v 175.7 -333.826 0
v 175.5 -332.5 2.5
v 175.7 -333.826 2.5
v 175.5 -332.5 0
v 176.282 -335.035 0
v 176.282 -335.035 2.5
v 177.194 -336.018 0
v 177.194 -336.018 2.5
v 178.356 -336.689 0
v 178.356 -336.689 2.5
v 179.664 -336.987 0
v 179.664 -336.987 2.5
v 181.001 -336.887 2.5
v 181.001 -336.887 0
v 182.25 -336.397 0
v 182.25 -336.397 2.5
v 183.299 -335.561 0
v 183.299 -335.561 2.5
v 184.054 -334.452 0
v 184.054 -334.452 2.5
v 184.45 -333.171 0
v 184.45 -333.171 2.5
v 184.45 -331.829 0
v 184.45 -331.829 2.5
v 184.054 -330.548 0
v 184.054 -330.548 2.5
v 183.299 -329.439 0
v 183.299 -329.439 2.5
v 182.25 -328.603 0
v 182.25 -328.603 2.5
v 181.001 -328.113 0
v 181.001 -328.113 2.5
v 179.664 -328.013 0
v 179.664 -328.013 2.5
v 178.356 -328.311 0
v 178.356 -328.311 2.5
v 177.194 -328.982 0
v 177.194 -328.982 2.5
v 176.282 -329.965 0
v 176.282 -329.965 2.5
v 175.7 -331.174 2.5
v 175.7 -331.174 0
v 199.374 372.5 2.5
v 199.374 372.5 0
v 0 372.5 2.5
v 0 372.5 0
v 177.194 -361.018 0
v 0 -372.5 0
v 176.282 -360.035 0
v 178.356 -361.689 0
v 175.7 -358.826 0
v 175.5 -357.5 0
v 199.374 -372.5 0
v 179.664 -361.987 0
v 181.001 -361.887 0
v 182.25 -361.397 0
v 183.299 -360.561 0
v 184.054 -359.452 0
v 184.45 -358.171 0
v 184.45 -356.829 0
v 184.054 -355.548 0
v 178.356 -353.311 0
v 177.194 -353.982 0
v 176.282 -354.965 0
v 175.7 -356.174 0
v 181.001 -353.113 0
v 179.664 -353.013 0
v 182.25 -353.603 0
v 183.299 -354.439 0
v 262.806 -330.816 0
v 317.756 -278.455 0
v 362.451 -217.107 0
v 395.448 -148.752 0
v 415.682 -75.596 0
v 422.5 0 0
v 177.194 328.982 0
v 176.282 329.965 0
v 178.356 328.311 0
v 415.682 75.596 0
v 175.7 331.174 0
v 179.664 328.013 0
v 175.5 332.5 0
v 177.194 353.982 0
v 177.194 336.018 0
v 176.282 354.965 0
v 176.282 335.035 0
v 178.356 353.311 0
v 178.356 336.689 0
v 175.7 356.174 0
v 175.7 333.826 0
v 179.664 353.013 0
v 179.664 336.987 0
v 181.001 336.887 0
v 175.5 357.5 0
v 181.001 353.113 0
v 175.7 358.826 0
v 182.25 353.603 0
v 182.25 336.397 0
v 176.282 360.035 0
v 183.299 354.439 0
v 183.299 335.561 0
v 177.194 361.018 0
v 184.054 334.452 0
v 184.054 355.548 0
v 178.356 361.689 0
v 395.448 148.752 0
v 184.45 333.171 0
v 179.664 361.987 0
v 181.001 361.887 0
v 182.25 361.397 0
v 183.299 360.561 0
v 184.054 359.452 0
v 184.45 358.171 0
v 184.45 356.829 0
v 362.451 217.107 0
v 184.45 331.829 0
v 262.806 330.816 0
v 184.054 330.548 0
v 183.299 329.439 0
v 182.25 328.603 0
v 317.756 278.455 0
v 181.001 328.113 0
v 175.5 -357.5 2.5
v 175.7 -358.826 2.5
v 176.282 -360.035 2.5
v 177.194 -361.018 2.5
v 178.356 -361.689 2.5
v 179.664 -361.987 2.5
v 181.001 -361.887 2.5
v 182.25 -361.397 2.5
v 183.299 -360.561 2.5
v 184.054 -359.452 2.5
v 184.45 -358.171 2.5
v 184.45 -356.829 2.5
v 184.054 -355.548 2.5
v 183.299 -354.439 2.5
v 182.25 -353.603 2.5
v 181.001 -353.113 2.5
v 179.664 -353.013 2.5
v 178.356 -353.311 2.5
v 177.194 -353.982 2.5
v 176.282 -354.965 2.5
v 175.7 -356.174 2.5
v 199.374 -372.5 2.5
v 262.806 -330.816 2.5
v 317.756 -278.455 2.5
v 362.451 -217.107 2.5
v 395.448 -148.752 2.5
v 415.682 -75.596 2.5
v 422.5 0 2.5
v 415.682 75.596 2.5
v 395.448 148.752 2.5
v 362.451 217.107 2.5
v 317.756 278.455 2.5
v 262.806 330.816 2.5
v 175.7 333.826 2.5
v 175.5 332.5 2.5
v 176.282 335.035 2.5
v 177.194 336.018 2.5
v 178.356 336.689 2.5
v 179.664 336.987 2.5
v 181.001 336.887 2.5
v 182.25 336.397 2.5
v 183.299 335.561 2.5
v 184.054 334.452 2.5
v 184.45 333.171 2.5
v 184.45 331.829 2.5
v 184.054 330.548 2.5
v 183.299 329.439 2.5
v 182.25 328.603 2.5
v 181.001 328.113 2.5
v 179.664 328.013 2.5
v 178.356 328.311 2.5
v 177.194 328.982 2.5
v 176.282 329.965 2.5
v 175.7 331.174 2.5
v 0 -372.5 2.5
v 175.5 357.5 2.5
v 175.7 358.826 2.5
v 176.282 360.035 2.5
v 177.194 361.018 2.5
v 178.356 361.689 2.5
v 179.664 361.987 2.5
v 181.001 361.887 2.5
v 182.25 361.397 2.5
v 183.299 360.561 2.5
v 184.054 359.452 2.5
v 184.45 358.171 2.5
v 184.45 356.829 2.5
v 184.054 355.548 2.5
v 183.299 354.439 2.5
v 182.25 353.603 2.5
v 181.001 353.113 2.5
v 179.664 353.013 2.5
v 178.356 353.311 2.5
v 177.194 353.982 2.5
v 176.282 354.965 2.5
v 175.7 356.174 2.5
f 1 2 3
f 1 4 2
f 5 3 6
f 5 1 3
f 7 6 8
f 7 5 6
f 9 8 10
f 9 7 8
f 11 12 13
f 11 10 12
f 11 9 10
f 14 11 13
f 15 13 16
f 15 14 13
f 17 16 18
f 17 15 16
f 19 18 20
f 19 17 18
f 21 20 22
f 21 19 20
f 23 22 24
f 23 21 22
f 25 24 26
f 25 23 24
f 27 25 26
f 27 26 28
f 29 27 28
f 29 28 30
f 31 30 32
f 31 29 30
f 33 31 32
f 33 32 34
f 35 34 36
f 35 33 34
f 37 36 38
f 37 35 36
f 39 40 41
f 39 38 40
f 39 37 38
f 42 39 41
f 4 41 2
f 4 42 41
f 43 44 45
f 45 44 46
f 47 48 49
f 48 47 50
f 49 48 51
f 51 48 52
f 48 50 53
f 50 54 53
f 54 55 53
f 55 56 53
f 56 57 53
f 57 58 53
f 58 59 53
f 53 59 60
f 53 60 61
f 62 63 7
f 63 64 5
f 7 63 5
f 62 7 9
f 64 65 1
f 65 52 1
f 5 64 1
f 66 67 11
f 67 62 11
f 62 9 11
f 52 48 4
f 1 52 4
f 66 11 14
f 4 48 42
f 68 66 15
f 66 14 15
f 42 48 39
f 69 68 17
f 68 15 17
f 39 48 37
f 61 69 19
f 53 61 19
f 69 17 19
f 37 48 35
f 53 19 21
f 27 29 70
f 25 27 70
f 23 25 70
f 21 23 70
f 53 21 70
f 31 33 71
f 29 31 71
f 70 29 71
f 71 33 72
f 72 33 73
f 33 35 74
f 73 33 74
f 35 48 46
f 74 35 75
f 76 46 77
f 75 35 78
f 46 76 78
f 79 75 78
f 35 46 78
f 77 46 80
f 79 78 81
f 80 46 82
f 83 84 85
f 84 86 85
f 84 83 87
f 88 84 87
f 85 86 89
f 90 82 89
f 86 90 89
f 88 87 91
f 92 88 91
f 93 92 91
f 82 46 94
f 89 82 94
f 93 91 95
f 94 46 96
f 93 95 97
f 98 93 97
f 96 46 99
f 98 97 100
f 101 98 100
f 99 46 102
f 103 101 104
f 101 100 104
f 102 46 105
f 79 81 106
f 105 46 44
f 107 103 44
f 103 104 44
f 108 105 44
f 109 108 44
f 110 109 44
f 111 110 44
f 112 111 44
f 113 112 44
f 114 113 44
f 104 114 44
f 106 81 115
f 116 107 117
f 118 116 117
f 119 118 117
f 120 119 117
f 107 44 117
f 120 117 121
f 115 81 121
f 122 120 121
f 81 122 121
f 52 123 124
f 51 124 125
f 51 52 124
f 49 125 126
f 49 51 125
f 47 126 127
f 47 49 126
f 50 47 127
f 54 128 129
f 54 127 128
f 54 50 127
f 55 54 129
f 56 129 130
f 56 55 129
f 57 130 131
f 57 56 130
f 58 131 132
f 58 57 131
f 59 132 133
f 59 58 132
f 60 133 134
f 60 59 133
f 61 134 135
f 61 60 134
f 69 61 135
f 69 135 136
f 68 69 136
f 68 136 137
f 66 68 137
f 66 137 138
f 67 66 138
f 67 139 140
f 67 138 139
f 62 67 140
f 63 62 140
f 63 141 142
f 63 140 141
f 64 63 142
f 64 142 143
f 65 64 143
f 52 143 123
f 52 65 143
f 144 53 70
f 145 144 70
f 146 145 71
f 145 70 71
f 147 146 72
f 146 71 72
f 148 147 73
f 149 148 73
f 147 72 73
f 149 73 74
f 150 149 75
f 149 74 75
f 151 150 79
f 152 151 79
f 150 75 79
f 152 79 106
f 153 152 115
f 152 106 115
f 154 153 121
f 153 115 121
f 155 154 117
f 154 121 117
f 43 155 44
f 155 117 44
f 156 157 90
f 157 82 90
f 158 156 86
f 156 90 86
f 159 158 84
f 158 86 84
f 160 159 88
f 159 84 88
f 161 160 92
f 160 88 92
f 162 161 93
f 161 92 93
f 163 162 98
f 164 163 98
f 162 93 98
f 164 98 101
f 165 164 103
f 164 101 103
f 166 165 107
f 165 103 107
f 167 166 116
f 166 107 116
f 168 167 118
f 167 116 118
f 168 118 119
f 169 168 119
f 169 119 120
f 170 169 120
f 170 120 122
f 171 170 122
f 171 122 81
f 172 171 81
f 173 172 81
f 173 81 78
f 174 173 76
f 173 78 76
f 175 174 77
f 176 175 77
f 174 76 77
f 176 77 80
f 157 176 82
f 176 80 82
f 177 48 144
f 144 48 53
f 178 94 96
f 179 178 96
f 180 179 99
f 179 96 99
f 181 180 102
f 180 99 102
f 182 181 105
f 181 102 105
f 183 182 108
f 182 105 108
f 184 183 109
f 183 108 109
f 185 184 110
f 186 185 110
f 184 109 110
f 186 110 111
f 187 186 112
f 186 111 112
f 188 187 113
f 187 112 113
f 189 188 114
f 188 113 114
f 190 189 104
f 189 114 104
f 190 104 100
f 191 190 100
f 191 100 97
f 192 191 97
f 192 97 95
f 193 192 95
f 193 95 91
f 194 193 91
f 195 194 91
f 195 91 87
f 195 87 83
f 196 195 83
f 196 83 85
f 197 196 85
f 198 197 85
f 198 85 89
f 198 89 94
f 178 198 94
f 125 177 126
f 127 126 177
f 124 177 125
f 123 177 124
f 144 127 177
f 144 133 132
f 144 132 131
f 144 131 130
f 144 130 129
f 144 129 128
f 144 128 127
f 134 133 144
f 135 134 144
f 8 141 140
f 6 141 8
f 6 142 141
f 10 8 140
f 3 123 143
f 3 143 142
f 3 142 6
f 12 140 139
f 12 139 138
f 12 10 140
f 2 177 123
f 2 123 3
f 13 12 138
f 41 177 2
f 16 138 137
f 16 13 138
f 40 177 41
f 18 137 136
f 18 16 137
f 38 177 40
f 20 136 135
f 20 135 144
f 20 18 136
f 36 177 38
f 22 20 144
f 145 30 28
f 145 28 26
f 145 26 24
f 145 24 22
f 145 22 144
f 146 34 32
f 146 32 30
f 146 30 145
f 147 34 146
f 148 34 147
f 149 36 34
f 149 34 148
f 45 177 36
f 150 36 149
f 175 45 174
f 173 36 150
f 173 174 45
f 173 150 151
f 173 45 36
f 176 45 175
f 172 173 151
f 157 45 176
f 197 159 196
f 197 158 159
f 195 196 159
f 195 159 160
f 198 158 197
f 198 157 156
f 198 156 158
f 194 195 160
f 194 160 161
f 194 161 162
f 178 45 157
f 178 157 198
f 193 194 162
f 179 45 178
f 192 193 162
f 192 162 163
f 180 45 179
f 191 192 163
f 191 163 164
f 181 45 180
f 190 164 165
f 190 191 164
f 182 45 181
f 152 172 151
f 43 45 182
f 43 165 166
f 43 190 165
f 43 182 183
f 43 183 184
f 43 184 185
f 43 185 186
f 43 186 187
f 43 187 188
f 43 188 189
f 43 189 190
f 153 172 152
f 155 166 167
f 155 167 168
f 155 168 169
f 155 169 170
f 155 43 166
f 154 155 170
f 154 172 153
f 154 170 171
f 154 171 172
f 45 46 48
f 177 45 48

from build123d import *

# Parameters (mm, degrees)
BOSS_EXTRUDE1_DEPTH = 2.5
SKETCH3_R           = 4.5
CUT_EXTRUDE1_DEPTH  = 564.266144908


with BuildPart() as part:
    # Sketch2 → Boss-Extrude1 (new body)
    with BuildSketch(Plane.XY):
        with BuildLine():
            Line((0, 372.5), (0, -372.5))
            Line((0, -372.5), (199.374020374, -372.5))
            ThreePointArc((199.374020374, -372.5), (422.5, 0), (199.374020374, 372.5))
            Line((199.374020374, 372.5), (0, 372.5))
        make_face()
    extrude(amount=BOSS_EXTRUDE1_DEPTH)

    # Sketch3 → Cut-Extrude1 (cut, symmetric)
    with BuildSketch(Plane(origin=(0, 0, 0), x_dir=(-1, 0, 0), z_dir=(0, 0, -1))):
        with Locations((-180, 357.5)):
            Circle(SKETCH3_R)
        with Locations((-180, 332.5)):
            Circle(SKETCH3_R)
    cut_extrude1 = extrude(amount=CUT_EXTRUDE1_DEPTH, both=True, mode=Mode.SUBTRACT)

    # Mirror1: Cut-Extrude1 across plane
    add(cut_extrude1.mirror(Plane.ZX), mode=Mode.SUBTRACT)


solid = part.part
